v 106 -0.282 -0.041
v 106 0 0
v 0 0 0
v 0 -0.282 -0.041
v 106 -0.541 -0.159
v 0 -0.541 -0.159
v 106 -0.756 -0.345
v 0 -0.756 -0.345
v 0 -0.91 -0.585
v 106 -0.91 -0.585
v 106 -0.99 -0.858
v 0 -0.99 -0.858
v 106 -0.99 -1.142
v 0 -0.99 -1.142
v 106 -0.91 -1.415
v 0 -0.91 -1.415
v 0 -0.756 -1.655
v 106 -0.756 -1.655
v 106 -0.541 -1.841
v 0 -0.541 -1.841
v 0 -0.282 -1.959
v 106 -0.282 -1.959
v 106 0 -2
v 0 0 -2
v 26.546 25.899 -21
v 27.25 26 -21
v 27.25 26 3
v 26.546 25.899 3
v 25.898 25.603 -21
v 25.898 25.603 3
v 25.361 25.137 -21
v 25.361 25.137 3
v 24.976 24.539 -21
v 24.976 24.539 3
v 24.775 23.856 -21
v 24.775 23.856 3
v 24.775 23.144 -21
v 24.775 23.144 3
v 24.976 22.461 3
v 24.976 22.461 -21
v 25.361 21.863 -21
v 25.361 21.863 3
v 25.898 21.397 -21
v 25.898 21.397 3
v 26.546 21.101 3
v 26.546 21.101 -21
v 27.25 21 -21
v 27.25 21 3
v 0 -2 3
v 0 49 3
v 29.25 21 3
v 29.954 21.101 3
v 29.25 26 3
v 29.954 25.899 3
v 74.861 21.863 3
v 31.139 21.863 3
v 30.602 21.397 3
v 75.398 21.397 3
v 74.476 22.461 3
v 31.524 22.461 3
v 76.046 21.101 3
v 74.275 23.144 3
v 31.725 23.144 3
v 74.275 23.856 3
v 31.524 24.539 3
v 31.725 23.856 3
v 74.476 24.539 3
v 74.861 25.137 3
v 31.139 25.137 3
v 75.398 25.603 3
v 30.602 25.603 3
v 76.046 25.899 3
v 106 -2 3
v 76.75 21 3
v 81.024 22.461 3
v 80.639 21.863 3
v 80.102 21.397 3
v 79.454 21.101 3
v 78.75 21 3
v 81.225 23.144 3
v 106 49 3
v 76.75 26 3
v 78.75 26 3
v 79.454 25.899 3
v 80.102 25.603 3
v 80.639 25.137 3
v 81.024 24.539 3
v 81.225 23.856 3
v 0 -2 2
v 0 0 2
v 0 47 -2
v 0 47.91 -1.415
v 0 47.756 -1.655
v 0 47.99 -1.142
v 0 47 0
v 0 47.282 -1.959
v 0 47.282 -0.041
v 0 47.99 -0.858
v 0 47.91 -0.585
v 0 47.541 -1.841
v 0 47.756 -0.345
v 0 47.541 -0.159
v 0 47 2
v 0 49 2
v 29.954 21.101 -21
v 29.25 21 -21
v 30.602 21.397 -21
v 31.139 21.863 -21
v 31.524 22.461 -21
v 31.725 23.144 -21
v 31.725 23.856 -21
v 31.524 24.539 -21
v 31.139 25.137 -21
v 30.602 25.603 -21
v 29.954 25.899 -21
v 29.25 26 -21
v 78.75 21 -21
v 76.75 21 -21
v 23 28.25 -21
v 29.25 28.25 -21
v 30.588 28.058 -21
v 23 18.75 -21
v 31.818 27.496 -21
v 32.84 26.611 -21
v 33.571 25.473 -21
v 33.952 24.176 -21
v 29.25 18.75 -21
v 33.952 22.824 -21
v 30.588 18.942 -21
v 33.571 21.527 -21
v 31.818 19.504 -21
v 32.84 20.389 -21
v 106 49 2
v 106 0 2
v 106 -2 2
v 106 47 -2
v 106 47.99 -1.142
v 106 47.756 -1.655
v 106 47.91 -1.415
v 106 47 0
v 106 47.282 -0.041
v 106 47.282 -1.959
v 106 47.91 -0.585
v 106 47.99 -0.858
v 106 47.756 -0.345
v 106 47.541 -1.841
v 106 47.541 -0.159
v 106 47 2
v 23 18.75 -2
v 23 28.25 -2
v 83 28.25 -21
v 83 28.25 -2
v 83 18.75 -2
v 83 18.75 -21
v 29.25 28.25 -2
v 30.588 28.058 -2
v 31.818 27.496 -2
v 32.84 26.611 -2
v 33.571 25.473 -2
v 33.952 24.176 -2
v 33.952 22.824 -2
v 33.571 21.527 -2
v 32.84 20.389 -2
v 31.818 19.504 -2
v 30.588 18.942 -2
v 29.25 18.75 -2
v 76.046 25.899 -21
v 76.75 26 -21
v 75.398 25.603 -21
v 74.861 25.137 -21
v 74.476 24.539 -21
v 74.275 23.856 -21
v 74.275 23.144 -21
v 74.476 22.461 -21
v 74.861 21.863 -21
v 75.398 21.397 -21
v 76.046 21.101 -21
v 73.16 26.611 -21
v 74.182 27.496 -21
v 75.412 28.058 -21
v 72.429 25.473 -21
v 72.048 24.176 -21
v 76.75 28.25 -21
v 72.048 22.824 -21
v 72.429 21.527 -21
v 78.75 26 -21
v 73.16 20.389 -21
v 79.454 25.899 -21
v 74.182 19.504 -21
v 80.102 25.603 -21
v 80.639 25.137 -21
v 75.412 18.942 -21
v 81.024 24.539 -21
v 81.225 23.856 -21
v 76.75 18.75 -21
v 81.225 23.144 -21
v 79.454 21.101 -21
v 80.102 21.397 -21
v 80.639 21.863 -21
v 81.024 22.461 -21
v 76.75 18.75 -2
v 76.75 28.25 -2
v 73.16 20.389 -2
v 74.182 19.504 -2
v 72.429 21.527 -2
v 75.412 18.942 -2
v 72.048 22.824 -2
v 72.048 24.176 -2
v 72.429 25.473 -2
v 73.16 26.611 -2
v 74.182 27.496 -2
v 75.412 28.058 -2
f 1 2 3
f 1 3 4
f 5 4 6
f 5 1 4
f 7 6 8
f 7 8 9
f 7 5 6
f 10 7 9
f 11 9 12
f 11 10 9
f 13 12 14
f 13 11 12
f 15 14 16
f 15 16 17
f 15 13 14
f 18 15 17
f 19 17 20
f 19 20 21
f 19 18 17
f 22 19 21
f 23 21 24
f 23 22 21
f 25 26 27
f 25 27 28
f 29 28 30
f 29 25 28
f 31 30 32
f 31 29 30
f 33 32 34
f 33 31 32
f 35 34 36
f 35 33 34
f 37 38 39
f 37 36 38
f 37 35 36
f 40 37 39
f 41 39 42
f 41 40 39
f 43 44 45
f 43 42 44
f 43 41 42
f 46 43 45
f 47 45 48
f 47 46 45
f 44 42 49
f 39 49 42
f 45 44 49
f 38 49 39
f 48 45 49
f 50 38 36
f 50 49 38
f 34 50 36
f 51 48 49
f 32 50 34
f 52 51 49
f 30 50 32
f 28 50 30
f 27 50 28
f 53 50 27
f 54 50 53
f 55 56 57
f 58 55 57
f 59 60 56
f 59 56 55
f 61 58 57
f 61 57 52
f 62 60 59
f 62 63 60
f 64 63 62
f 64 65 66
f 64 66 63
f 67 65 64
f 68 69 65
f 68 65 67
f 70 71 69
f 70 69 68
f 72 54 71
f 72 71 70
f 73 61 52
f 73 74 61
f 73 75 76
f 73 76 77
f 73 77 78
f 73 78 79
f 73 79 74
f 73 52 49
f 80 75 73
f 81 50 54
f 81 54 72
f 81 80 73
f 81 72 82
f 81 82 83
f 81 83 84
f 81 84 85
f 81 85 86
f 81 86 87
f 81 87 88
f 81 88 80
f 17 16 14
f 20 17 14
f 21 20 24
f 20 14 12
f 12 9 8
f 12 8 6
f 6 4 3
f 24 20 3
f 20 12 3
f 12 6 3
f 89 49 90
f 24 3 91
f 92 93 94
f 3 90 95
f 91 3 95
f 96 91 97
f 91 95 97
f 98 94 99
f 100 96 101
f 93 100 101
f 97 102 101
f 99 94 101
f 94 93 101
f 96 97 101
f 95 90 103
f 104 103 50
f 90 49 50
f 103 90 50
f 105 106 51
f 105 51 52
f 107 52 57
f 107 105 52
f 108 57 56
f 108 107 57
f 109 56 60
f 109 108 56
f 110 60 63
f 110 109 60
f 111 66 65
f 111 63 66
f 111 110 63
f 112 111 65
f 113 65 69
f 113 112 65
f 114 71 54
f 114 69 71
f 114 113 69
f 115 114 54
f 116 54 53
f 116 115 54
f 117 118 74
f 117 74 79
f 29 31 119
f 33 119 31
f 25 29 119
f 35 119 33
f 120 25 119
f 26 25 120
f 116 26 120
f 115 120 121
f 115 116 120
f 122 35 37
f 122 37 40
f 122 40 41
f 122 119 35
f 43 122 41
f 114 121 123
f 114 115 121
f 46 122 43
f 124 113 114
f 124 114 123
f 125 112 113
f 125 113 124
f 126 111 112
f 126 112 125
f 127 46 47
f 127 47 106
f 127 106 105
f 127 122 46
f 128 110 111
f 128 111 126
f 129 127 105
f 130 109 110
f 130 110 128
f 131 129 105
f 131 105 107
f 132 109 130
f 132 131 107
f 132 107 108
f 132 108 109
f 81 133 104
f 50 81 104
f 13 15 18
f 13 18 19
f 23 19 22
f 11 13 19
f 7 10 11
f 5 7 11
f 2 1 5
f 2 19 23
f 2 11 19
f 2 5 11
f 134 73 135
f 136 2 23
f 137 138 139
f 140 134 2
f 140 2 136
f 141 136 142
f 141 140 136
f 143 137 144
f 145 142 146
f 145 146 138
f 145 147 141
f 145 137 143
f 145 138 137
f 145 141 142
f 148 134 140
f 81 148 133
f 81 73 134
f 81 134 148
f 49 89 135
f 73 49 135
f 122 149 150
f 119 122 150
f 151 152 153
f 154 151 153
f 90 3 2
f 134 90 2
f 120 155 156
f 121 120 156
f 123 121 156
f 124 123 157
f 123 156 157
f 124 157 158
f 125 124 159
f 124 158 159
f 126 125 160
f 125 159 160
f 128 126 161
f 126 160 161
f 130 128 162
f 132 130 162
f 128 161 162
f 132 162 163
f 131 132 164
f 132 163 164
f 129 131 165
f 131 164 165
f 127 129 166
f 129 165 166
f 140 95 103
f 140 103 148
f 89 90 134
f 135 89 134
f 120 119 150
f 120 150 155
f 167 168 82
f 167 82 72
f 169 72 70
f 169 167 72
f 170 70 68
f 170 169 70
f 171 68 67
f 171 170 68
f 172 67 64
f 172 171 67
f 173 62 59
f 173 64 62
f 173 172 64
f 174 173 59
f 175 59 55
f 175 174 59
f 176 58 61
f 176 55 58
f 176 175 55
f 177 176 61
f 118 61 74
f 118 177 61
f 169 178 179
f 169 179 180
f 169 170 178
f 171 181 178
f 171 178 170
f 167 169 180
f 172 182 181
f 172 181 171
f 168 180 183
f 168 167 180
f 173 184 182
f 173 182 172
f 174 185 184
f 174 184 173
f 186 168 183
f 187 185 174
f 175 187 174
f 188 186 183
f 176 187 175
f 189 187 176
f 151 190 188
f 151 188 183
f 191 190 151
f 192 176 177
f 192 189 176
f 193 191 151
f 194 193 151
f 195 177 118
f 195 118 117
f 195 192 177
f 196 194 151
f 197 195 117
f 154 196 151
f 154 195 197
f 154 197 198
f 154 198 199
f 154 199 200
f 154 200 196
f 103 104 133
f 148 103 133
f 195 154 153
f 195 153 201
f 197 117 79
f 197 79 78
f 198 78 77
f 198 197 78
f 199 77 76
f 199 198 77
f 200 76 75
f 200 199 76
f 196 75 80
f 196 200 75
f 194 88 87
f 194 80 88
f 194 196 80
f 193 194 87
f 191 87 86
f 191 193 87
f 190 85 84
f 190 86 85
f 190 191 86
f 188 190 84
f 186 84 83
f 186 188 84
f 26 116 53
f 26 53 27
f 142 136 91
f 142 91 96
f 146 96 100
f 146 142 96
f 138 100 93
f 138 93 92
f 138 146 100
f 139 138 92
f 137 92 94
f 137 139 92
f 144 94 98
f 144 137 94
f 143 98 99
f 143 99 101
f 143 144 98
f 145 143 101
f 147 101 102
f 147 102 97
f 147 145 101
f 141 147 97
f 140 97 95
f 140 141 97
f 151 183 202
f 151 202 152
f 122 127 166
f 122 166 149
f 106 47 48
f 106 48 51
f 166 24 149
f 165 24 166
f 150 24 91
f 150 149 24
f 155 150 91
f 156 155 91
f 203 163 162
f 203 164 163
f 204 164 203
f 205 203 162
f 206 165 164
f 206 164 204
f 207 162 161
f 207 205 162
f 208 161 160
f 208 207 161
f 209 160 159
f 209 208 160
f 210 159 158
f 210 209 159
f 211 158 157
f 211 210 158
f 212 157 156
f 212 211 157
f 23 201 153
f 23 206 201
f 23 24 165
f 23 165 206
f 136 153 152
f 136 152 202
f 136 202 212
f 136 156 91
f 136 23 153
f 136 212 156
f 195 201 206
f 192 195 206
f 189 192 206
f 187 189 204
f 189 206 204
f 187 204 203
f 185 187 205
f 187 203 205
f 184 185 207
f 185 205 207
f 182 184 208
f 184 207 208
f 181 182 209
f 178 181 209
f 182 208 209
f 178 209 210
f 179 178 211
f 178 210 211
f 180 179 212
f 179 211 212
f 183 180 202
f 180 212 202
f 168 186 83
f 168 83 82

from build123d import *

# Parameters (mm, degrees)
F0_W     = 106
F0_H     = 47
F1_DEPTH = 2
F3_DEPTH = 1
F5_DEPTH = 106
F7_DEPTH = 19
F8_DEPTH = 25


with BuildPart() as f1:
    # F0 (on Top) → F1 (new body)
    with BuildSketch(Plane.XY):
        with Locations((53, 23.5)):
            Rectangle(F0_W, F0_H)
    extrude(amount=F1_DEPTH)

    # F2 (on face) → F3 (join)
    with BuildSketch(Plane.XY.offset(2)):
        Polygon((0, 49), (0, 0), (0, -2), (106, -2), (106, 49), align=None)
    extrude(amount=F3_DEPTH)

    # F4 (on face) → F5 (join)
    with BuildSketch(Plane.YZ.offset(106)):
        with BuildLine():
            Line((47, 0), (0, 0))
            ThreePointArc((0, 0), (-1, -1), (0, -2))
            Line((0, -2), (47, -2))
            ThreePointArc((47, -2), (48, -1), (47, 0))
        make_face()
    extrude(amount=-F5_DEPTH)

    # F6 (on face) → F7 (join)
    with BuildSketch(Plane(origin=(0, 0, -2), x_dir=(1, 0, 0), z_dir=(0, 0, -1))):
        with BuildLine():
            Line((23, -28.25), (29.25, -28.25))
            ThreePointArc((29.25, -28.25), (34, -23.5), (29.25, -18.75))
            Line((29.25, -18.75), (23, -18.75))
            Line((23, -18.75), (23, -28.25))
        make_face()
        with BuildLine():
            Line((27.25, -21), (29.25, -21))
            ThreePointArc((29.25, -21), (31.75, -23.5), (29.25, -26))
            Line((29.25, -26), (27.25, -26))
            ThreePointArc((27.25, -26), (24.75, -23.5), (27.25, -21))
        make_face(mode=Mode.SUBTRACT)
        with BuildLine():
            Line((83, -18.75), (76.75, -18.75))
            ThreePointArc((76.75, -18.75), (72, -23.5), (76.75, -28.25))
            Line((76.75, -28.25), (83, -28.25))
            Line((83, -28.25), (83, -18.75))
        make_face()
        with BuildLine():
            ThreePointArc((76.75, -26), (74.25, -23.5), (76.75, -21))
            Line((76.75, -21), (78.75, -21))
            ThreePointArc((78.75, -21), (81.25, -23.5), (78.75, -26))
            Line((78.75, -26), (76.75, -26))
        make_face(mode=Mode.SUBTRACT)
    extrude(amount=F7_DEPTH)

    # F8 (cut): faces of the model
    f8_faces = [f1.faces().sort_by_distance(p)[0] for p in [
        (28.25, 23.5, -2),
        (77.75, 23.5, -2),
    ]]
    extrude(f8_faces, amount=-F8_DEPTH, mode=Mode.SUBTRACT)


solid = f1.part
